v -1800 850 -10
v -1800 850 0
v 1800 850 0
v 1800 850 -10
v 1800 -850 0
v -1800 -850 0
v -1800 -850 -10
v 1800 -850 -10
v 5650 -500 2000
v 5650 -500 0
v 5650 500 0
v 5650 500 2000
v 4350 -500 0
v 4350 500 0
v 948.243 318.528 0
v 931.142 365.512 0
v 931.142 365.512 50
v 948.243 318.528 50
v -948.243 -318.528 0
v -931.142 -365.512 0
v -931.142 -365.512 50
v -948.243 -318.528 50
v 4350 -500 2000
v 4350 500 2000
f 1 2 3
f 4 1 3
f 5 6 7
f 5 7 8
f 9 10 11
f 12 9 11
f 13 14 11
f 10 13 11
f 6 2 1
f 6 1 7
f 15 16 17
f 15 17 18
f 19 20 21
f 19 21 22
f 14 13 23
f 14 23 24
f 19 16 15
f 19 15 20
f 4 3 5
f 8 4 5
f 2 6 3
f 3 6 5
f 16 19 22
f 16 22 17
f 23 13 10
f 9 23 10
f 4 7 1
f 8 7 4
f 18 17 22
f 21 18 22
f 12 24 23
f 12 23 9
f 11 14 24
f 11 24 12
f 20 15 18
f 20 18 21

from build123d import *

# Parameters (mm, degrees)
EXTRUDE_DEPTH    = 50
SKETCH001_W      = 3600
SKETCH001_H      = 1700
EXTRUDE001_DEPTH = 10
SKETCH002_W      = 1300
SKETCH002_H      = 1000
EXTRUDE002_DEPTH = 2000


with BuildPart() as extrude_body:
    # Sketch → Extrude (new body)
    with BuildSketch(Plane.XY):
        Polygon((-948.243124, -318.527828), (931.142117, 365.512459), (948.243124, 318.527828), (-931.142117, -365.512459), align=None)
    extrude(amount=EXTRUDE_DEPTH)


with BuildPart() as extrude001:
    # Sketch001 (on Face5 of Extrude) → Extrude001 (new body)
    with BuildSketch(Plane(origin=(0, 0, 0), x_dir=(1, 0, 0), z_dir=(0, 0, -1))):
        Rectangle(SKETCH001_W, SKETCH001_H)
    extrude(amount=EXTRUDE001_DEPTH)


with BuildPart() as extrude002:
    # Sketch002 (on Face5 of Extrude001) → Extrude002 (new body)
    with BuildSketch(Plane.XY):
        with Locations((5000, 0)):
            Rectangle(SKETCH002_W, SKETCH002_H)
    extrude(amount=EXTRUDE002_DEPTH)


solid = Compound([extrude_body.part, extrude001.part, extrude002.part])
